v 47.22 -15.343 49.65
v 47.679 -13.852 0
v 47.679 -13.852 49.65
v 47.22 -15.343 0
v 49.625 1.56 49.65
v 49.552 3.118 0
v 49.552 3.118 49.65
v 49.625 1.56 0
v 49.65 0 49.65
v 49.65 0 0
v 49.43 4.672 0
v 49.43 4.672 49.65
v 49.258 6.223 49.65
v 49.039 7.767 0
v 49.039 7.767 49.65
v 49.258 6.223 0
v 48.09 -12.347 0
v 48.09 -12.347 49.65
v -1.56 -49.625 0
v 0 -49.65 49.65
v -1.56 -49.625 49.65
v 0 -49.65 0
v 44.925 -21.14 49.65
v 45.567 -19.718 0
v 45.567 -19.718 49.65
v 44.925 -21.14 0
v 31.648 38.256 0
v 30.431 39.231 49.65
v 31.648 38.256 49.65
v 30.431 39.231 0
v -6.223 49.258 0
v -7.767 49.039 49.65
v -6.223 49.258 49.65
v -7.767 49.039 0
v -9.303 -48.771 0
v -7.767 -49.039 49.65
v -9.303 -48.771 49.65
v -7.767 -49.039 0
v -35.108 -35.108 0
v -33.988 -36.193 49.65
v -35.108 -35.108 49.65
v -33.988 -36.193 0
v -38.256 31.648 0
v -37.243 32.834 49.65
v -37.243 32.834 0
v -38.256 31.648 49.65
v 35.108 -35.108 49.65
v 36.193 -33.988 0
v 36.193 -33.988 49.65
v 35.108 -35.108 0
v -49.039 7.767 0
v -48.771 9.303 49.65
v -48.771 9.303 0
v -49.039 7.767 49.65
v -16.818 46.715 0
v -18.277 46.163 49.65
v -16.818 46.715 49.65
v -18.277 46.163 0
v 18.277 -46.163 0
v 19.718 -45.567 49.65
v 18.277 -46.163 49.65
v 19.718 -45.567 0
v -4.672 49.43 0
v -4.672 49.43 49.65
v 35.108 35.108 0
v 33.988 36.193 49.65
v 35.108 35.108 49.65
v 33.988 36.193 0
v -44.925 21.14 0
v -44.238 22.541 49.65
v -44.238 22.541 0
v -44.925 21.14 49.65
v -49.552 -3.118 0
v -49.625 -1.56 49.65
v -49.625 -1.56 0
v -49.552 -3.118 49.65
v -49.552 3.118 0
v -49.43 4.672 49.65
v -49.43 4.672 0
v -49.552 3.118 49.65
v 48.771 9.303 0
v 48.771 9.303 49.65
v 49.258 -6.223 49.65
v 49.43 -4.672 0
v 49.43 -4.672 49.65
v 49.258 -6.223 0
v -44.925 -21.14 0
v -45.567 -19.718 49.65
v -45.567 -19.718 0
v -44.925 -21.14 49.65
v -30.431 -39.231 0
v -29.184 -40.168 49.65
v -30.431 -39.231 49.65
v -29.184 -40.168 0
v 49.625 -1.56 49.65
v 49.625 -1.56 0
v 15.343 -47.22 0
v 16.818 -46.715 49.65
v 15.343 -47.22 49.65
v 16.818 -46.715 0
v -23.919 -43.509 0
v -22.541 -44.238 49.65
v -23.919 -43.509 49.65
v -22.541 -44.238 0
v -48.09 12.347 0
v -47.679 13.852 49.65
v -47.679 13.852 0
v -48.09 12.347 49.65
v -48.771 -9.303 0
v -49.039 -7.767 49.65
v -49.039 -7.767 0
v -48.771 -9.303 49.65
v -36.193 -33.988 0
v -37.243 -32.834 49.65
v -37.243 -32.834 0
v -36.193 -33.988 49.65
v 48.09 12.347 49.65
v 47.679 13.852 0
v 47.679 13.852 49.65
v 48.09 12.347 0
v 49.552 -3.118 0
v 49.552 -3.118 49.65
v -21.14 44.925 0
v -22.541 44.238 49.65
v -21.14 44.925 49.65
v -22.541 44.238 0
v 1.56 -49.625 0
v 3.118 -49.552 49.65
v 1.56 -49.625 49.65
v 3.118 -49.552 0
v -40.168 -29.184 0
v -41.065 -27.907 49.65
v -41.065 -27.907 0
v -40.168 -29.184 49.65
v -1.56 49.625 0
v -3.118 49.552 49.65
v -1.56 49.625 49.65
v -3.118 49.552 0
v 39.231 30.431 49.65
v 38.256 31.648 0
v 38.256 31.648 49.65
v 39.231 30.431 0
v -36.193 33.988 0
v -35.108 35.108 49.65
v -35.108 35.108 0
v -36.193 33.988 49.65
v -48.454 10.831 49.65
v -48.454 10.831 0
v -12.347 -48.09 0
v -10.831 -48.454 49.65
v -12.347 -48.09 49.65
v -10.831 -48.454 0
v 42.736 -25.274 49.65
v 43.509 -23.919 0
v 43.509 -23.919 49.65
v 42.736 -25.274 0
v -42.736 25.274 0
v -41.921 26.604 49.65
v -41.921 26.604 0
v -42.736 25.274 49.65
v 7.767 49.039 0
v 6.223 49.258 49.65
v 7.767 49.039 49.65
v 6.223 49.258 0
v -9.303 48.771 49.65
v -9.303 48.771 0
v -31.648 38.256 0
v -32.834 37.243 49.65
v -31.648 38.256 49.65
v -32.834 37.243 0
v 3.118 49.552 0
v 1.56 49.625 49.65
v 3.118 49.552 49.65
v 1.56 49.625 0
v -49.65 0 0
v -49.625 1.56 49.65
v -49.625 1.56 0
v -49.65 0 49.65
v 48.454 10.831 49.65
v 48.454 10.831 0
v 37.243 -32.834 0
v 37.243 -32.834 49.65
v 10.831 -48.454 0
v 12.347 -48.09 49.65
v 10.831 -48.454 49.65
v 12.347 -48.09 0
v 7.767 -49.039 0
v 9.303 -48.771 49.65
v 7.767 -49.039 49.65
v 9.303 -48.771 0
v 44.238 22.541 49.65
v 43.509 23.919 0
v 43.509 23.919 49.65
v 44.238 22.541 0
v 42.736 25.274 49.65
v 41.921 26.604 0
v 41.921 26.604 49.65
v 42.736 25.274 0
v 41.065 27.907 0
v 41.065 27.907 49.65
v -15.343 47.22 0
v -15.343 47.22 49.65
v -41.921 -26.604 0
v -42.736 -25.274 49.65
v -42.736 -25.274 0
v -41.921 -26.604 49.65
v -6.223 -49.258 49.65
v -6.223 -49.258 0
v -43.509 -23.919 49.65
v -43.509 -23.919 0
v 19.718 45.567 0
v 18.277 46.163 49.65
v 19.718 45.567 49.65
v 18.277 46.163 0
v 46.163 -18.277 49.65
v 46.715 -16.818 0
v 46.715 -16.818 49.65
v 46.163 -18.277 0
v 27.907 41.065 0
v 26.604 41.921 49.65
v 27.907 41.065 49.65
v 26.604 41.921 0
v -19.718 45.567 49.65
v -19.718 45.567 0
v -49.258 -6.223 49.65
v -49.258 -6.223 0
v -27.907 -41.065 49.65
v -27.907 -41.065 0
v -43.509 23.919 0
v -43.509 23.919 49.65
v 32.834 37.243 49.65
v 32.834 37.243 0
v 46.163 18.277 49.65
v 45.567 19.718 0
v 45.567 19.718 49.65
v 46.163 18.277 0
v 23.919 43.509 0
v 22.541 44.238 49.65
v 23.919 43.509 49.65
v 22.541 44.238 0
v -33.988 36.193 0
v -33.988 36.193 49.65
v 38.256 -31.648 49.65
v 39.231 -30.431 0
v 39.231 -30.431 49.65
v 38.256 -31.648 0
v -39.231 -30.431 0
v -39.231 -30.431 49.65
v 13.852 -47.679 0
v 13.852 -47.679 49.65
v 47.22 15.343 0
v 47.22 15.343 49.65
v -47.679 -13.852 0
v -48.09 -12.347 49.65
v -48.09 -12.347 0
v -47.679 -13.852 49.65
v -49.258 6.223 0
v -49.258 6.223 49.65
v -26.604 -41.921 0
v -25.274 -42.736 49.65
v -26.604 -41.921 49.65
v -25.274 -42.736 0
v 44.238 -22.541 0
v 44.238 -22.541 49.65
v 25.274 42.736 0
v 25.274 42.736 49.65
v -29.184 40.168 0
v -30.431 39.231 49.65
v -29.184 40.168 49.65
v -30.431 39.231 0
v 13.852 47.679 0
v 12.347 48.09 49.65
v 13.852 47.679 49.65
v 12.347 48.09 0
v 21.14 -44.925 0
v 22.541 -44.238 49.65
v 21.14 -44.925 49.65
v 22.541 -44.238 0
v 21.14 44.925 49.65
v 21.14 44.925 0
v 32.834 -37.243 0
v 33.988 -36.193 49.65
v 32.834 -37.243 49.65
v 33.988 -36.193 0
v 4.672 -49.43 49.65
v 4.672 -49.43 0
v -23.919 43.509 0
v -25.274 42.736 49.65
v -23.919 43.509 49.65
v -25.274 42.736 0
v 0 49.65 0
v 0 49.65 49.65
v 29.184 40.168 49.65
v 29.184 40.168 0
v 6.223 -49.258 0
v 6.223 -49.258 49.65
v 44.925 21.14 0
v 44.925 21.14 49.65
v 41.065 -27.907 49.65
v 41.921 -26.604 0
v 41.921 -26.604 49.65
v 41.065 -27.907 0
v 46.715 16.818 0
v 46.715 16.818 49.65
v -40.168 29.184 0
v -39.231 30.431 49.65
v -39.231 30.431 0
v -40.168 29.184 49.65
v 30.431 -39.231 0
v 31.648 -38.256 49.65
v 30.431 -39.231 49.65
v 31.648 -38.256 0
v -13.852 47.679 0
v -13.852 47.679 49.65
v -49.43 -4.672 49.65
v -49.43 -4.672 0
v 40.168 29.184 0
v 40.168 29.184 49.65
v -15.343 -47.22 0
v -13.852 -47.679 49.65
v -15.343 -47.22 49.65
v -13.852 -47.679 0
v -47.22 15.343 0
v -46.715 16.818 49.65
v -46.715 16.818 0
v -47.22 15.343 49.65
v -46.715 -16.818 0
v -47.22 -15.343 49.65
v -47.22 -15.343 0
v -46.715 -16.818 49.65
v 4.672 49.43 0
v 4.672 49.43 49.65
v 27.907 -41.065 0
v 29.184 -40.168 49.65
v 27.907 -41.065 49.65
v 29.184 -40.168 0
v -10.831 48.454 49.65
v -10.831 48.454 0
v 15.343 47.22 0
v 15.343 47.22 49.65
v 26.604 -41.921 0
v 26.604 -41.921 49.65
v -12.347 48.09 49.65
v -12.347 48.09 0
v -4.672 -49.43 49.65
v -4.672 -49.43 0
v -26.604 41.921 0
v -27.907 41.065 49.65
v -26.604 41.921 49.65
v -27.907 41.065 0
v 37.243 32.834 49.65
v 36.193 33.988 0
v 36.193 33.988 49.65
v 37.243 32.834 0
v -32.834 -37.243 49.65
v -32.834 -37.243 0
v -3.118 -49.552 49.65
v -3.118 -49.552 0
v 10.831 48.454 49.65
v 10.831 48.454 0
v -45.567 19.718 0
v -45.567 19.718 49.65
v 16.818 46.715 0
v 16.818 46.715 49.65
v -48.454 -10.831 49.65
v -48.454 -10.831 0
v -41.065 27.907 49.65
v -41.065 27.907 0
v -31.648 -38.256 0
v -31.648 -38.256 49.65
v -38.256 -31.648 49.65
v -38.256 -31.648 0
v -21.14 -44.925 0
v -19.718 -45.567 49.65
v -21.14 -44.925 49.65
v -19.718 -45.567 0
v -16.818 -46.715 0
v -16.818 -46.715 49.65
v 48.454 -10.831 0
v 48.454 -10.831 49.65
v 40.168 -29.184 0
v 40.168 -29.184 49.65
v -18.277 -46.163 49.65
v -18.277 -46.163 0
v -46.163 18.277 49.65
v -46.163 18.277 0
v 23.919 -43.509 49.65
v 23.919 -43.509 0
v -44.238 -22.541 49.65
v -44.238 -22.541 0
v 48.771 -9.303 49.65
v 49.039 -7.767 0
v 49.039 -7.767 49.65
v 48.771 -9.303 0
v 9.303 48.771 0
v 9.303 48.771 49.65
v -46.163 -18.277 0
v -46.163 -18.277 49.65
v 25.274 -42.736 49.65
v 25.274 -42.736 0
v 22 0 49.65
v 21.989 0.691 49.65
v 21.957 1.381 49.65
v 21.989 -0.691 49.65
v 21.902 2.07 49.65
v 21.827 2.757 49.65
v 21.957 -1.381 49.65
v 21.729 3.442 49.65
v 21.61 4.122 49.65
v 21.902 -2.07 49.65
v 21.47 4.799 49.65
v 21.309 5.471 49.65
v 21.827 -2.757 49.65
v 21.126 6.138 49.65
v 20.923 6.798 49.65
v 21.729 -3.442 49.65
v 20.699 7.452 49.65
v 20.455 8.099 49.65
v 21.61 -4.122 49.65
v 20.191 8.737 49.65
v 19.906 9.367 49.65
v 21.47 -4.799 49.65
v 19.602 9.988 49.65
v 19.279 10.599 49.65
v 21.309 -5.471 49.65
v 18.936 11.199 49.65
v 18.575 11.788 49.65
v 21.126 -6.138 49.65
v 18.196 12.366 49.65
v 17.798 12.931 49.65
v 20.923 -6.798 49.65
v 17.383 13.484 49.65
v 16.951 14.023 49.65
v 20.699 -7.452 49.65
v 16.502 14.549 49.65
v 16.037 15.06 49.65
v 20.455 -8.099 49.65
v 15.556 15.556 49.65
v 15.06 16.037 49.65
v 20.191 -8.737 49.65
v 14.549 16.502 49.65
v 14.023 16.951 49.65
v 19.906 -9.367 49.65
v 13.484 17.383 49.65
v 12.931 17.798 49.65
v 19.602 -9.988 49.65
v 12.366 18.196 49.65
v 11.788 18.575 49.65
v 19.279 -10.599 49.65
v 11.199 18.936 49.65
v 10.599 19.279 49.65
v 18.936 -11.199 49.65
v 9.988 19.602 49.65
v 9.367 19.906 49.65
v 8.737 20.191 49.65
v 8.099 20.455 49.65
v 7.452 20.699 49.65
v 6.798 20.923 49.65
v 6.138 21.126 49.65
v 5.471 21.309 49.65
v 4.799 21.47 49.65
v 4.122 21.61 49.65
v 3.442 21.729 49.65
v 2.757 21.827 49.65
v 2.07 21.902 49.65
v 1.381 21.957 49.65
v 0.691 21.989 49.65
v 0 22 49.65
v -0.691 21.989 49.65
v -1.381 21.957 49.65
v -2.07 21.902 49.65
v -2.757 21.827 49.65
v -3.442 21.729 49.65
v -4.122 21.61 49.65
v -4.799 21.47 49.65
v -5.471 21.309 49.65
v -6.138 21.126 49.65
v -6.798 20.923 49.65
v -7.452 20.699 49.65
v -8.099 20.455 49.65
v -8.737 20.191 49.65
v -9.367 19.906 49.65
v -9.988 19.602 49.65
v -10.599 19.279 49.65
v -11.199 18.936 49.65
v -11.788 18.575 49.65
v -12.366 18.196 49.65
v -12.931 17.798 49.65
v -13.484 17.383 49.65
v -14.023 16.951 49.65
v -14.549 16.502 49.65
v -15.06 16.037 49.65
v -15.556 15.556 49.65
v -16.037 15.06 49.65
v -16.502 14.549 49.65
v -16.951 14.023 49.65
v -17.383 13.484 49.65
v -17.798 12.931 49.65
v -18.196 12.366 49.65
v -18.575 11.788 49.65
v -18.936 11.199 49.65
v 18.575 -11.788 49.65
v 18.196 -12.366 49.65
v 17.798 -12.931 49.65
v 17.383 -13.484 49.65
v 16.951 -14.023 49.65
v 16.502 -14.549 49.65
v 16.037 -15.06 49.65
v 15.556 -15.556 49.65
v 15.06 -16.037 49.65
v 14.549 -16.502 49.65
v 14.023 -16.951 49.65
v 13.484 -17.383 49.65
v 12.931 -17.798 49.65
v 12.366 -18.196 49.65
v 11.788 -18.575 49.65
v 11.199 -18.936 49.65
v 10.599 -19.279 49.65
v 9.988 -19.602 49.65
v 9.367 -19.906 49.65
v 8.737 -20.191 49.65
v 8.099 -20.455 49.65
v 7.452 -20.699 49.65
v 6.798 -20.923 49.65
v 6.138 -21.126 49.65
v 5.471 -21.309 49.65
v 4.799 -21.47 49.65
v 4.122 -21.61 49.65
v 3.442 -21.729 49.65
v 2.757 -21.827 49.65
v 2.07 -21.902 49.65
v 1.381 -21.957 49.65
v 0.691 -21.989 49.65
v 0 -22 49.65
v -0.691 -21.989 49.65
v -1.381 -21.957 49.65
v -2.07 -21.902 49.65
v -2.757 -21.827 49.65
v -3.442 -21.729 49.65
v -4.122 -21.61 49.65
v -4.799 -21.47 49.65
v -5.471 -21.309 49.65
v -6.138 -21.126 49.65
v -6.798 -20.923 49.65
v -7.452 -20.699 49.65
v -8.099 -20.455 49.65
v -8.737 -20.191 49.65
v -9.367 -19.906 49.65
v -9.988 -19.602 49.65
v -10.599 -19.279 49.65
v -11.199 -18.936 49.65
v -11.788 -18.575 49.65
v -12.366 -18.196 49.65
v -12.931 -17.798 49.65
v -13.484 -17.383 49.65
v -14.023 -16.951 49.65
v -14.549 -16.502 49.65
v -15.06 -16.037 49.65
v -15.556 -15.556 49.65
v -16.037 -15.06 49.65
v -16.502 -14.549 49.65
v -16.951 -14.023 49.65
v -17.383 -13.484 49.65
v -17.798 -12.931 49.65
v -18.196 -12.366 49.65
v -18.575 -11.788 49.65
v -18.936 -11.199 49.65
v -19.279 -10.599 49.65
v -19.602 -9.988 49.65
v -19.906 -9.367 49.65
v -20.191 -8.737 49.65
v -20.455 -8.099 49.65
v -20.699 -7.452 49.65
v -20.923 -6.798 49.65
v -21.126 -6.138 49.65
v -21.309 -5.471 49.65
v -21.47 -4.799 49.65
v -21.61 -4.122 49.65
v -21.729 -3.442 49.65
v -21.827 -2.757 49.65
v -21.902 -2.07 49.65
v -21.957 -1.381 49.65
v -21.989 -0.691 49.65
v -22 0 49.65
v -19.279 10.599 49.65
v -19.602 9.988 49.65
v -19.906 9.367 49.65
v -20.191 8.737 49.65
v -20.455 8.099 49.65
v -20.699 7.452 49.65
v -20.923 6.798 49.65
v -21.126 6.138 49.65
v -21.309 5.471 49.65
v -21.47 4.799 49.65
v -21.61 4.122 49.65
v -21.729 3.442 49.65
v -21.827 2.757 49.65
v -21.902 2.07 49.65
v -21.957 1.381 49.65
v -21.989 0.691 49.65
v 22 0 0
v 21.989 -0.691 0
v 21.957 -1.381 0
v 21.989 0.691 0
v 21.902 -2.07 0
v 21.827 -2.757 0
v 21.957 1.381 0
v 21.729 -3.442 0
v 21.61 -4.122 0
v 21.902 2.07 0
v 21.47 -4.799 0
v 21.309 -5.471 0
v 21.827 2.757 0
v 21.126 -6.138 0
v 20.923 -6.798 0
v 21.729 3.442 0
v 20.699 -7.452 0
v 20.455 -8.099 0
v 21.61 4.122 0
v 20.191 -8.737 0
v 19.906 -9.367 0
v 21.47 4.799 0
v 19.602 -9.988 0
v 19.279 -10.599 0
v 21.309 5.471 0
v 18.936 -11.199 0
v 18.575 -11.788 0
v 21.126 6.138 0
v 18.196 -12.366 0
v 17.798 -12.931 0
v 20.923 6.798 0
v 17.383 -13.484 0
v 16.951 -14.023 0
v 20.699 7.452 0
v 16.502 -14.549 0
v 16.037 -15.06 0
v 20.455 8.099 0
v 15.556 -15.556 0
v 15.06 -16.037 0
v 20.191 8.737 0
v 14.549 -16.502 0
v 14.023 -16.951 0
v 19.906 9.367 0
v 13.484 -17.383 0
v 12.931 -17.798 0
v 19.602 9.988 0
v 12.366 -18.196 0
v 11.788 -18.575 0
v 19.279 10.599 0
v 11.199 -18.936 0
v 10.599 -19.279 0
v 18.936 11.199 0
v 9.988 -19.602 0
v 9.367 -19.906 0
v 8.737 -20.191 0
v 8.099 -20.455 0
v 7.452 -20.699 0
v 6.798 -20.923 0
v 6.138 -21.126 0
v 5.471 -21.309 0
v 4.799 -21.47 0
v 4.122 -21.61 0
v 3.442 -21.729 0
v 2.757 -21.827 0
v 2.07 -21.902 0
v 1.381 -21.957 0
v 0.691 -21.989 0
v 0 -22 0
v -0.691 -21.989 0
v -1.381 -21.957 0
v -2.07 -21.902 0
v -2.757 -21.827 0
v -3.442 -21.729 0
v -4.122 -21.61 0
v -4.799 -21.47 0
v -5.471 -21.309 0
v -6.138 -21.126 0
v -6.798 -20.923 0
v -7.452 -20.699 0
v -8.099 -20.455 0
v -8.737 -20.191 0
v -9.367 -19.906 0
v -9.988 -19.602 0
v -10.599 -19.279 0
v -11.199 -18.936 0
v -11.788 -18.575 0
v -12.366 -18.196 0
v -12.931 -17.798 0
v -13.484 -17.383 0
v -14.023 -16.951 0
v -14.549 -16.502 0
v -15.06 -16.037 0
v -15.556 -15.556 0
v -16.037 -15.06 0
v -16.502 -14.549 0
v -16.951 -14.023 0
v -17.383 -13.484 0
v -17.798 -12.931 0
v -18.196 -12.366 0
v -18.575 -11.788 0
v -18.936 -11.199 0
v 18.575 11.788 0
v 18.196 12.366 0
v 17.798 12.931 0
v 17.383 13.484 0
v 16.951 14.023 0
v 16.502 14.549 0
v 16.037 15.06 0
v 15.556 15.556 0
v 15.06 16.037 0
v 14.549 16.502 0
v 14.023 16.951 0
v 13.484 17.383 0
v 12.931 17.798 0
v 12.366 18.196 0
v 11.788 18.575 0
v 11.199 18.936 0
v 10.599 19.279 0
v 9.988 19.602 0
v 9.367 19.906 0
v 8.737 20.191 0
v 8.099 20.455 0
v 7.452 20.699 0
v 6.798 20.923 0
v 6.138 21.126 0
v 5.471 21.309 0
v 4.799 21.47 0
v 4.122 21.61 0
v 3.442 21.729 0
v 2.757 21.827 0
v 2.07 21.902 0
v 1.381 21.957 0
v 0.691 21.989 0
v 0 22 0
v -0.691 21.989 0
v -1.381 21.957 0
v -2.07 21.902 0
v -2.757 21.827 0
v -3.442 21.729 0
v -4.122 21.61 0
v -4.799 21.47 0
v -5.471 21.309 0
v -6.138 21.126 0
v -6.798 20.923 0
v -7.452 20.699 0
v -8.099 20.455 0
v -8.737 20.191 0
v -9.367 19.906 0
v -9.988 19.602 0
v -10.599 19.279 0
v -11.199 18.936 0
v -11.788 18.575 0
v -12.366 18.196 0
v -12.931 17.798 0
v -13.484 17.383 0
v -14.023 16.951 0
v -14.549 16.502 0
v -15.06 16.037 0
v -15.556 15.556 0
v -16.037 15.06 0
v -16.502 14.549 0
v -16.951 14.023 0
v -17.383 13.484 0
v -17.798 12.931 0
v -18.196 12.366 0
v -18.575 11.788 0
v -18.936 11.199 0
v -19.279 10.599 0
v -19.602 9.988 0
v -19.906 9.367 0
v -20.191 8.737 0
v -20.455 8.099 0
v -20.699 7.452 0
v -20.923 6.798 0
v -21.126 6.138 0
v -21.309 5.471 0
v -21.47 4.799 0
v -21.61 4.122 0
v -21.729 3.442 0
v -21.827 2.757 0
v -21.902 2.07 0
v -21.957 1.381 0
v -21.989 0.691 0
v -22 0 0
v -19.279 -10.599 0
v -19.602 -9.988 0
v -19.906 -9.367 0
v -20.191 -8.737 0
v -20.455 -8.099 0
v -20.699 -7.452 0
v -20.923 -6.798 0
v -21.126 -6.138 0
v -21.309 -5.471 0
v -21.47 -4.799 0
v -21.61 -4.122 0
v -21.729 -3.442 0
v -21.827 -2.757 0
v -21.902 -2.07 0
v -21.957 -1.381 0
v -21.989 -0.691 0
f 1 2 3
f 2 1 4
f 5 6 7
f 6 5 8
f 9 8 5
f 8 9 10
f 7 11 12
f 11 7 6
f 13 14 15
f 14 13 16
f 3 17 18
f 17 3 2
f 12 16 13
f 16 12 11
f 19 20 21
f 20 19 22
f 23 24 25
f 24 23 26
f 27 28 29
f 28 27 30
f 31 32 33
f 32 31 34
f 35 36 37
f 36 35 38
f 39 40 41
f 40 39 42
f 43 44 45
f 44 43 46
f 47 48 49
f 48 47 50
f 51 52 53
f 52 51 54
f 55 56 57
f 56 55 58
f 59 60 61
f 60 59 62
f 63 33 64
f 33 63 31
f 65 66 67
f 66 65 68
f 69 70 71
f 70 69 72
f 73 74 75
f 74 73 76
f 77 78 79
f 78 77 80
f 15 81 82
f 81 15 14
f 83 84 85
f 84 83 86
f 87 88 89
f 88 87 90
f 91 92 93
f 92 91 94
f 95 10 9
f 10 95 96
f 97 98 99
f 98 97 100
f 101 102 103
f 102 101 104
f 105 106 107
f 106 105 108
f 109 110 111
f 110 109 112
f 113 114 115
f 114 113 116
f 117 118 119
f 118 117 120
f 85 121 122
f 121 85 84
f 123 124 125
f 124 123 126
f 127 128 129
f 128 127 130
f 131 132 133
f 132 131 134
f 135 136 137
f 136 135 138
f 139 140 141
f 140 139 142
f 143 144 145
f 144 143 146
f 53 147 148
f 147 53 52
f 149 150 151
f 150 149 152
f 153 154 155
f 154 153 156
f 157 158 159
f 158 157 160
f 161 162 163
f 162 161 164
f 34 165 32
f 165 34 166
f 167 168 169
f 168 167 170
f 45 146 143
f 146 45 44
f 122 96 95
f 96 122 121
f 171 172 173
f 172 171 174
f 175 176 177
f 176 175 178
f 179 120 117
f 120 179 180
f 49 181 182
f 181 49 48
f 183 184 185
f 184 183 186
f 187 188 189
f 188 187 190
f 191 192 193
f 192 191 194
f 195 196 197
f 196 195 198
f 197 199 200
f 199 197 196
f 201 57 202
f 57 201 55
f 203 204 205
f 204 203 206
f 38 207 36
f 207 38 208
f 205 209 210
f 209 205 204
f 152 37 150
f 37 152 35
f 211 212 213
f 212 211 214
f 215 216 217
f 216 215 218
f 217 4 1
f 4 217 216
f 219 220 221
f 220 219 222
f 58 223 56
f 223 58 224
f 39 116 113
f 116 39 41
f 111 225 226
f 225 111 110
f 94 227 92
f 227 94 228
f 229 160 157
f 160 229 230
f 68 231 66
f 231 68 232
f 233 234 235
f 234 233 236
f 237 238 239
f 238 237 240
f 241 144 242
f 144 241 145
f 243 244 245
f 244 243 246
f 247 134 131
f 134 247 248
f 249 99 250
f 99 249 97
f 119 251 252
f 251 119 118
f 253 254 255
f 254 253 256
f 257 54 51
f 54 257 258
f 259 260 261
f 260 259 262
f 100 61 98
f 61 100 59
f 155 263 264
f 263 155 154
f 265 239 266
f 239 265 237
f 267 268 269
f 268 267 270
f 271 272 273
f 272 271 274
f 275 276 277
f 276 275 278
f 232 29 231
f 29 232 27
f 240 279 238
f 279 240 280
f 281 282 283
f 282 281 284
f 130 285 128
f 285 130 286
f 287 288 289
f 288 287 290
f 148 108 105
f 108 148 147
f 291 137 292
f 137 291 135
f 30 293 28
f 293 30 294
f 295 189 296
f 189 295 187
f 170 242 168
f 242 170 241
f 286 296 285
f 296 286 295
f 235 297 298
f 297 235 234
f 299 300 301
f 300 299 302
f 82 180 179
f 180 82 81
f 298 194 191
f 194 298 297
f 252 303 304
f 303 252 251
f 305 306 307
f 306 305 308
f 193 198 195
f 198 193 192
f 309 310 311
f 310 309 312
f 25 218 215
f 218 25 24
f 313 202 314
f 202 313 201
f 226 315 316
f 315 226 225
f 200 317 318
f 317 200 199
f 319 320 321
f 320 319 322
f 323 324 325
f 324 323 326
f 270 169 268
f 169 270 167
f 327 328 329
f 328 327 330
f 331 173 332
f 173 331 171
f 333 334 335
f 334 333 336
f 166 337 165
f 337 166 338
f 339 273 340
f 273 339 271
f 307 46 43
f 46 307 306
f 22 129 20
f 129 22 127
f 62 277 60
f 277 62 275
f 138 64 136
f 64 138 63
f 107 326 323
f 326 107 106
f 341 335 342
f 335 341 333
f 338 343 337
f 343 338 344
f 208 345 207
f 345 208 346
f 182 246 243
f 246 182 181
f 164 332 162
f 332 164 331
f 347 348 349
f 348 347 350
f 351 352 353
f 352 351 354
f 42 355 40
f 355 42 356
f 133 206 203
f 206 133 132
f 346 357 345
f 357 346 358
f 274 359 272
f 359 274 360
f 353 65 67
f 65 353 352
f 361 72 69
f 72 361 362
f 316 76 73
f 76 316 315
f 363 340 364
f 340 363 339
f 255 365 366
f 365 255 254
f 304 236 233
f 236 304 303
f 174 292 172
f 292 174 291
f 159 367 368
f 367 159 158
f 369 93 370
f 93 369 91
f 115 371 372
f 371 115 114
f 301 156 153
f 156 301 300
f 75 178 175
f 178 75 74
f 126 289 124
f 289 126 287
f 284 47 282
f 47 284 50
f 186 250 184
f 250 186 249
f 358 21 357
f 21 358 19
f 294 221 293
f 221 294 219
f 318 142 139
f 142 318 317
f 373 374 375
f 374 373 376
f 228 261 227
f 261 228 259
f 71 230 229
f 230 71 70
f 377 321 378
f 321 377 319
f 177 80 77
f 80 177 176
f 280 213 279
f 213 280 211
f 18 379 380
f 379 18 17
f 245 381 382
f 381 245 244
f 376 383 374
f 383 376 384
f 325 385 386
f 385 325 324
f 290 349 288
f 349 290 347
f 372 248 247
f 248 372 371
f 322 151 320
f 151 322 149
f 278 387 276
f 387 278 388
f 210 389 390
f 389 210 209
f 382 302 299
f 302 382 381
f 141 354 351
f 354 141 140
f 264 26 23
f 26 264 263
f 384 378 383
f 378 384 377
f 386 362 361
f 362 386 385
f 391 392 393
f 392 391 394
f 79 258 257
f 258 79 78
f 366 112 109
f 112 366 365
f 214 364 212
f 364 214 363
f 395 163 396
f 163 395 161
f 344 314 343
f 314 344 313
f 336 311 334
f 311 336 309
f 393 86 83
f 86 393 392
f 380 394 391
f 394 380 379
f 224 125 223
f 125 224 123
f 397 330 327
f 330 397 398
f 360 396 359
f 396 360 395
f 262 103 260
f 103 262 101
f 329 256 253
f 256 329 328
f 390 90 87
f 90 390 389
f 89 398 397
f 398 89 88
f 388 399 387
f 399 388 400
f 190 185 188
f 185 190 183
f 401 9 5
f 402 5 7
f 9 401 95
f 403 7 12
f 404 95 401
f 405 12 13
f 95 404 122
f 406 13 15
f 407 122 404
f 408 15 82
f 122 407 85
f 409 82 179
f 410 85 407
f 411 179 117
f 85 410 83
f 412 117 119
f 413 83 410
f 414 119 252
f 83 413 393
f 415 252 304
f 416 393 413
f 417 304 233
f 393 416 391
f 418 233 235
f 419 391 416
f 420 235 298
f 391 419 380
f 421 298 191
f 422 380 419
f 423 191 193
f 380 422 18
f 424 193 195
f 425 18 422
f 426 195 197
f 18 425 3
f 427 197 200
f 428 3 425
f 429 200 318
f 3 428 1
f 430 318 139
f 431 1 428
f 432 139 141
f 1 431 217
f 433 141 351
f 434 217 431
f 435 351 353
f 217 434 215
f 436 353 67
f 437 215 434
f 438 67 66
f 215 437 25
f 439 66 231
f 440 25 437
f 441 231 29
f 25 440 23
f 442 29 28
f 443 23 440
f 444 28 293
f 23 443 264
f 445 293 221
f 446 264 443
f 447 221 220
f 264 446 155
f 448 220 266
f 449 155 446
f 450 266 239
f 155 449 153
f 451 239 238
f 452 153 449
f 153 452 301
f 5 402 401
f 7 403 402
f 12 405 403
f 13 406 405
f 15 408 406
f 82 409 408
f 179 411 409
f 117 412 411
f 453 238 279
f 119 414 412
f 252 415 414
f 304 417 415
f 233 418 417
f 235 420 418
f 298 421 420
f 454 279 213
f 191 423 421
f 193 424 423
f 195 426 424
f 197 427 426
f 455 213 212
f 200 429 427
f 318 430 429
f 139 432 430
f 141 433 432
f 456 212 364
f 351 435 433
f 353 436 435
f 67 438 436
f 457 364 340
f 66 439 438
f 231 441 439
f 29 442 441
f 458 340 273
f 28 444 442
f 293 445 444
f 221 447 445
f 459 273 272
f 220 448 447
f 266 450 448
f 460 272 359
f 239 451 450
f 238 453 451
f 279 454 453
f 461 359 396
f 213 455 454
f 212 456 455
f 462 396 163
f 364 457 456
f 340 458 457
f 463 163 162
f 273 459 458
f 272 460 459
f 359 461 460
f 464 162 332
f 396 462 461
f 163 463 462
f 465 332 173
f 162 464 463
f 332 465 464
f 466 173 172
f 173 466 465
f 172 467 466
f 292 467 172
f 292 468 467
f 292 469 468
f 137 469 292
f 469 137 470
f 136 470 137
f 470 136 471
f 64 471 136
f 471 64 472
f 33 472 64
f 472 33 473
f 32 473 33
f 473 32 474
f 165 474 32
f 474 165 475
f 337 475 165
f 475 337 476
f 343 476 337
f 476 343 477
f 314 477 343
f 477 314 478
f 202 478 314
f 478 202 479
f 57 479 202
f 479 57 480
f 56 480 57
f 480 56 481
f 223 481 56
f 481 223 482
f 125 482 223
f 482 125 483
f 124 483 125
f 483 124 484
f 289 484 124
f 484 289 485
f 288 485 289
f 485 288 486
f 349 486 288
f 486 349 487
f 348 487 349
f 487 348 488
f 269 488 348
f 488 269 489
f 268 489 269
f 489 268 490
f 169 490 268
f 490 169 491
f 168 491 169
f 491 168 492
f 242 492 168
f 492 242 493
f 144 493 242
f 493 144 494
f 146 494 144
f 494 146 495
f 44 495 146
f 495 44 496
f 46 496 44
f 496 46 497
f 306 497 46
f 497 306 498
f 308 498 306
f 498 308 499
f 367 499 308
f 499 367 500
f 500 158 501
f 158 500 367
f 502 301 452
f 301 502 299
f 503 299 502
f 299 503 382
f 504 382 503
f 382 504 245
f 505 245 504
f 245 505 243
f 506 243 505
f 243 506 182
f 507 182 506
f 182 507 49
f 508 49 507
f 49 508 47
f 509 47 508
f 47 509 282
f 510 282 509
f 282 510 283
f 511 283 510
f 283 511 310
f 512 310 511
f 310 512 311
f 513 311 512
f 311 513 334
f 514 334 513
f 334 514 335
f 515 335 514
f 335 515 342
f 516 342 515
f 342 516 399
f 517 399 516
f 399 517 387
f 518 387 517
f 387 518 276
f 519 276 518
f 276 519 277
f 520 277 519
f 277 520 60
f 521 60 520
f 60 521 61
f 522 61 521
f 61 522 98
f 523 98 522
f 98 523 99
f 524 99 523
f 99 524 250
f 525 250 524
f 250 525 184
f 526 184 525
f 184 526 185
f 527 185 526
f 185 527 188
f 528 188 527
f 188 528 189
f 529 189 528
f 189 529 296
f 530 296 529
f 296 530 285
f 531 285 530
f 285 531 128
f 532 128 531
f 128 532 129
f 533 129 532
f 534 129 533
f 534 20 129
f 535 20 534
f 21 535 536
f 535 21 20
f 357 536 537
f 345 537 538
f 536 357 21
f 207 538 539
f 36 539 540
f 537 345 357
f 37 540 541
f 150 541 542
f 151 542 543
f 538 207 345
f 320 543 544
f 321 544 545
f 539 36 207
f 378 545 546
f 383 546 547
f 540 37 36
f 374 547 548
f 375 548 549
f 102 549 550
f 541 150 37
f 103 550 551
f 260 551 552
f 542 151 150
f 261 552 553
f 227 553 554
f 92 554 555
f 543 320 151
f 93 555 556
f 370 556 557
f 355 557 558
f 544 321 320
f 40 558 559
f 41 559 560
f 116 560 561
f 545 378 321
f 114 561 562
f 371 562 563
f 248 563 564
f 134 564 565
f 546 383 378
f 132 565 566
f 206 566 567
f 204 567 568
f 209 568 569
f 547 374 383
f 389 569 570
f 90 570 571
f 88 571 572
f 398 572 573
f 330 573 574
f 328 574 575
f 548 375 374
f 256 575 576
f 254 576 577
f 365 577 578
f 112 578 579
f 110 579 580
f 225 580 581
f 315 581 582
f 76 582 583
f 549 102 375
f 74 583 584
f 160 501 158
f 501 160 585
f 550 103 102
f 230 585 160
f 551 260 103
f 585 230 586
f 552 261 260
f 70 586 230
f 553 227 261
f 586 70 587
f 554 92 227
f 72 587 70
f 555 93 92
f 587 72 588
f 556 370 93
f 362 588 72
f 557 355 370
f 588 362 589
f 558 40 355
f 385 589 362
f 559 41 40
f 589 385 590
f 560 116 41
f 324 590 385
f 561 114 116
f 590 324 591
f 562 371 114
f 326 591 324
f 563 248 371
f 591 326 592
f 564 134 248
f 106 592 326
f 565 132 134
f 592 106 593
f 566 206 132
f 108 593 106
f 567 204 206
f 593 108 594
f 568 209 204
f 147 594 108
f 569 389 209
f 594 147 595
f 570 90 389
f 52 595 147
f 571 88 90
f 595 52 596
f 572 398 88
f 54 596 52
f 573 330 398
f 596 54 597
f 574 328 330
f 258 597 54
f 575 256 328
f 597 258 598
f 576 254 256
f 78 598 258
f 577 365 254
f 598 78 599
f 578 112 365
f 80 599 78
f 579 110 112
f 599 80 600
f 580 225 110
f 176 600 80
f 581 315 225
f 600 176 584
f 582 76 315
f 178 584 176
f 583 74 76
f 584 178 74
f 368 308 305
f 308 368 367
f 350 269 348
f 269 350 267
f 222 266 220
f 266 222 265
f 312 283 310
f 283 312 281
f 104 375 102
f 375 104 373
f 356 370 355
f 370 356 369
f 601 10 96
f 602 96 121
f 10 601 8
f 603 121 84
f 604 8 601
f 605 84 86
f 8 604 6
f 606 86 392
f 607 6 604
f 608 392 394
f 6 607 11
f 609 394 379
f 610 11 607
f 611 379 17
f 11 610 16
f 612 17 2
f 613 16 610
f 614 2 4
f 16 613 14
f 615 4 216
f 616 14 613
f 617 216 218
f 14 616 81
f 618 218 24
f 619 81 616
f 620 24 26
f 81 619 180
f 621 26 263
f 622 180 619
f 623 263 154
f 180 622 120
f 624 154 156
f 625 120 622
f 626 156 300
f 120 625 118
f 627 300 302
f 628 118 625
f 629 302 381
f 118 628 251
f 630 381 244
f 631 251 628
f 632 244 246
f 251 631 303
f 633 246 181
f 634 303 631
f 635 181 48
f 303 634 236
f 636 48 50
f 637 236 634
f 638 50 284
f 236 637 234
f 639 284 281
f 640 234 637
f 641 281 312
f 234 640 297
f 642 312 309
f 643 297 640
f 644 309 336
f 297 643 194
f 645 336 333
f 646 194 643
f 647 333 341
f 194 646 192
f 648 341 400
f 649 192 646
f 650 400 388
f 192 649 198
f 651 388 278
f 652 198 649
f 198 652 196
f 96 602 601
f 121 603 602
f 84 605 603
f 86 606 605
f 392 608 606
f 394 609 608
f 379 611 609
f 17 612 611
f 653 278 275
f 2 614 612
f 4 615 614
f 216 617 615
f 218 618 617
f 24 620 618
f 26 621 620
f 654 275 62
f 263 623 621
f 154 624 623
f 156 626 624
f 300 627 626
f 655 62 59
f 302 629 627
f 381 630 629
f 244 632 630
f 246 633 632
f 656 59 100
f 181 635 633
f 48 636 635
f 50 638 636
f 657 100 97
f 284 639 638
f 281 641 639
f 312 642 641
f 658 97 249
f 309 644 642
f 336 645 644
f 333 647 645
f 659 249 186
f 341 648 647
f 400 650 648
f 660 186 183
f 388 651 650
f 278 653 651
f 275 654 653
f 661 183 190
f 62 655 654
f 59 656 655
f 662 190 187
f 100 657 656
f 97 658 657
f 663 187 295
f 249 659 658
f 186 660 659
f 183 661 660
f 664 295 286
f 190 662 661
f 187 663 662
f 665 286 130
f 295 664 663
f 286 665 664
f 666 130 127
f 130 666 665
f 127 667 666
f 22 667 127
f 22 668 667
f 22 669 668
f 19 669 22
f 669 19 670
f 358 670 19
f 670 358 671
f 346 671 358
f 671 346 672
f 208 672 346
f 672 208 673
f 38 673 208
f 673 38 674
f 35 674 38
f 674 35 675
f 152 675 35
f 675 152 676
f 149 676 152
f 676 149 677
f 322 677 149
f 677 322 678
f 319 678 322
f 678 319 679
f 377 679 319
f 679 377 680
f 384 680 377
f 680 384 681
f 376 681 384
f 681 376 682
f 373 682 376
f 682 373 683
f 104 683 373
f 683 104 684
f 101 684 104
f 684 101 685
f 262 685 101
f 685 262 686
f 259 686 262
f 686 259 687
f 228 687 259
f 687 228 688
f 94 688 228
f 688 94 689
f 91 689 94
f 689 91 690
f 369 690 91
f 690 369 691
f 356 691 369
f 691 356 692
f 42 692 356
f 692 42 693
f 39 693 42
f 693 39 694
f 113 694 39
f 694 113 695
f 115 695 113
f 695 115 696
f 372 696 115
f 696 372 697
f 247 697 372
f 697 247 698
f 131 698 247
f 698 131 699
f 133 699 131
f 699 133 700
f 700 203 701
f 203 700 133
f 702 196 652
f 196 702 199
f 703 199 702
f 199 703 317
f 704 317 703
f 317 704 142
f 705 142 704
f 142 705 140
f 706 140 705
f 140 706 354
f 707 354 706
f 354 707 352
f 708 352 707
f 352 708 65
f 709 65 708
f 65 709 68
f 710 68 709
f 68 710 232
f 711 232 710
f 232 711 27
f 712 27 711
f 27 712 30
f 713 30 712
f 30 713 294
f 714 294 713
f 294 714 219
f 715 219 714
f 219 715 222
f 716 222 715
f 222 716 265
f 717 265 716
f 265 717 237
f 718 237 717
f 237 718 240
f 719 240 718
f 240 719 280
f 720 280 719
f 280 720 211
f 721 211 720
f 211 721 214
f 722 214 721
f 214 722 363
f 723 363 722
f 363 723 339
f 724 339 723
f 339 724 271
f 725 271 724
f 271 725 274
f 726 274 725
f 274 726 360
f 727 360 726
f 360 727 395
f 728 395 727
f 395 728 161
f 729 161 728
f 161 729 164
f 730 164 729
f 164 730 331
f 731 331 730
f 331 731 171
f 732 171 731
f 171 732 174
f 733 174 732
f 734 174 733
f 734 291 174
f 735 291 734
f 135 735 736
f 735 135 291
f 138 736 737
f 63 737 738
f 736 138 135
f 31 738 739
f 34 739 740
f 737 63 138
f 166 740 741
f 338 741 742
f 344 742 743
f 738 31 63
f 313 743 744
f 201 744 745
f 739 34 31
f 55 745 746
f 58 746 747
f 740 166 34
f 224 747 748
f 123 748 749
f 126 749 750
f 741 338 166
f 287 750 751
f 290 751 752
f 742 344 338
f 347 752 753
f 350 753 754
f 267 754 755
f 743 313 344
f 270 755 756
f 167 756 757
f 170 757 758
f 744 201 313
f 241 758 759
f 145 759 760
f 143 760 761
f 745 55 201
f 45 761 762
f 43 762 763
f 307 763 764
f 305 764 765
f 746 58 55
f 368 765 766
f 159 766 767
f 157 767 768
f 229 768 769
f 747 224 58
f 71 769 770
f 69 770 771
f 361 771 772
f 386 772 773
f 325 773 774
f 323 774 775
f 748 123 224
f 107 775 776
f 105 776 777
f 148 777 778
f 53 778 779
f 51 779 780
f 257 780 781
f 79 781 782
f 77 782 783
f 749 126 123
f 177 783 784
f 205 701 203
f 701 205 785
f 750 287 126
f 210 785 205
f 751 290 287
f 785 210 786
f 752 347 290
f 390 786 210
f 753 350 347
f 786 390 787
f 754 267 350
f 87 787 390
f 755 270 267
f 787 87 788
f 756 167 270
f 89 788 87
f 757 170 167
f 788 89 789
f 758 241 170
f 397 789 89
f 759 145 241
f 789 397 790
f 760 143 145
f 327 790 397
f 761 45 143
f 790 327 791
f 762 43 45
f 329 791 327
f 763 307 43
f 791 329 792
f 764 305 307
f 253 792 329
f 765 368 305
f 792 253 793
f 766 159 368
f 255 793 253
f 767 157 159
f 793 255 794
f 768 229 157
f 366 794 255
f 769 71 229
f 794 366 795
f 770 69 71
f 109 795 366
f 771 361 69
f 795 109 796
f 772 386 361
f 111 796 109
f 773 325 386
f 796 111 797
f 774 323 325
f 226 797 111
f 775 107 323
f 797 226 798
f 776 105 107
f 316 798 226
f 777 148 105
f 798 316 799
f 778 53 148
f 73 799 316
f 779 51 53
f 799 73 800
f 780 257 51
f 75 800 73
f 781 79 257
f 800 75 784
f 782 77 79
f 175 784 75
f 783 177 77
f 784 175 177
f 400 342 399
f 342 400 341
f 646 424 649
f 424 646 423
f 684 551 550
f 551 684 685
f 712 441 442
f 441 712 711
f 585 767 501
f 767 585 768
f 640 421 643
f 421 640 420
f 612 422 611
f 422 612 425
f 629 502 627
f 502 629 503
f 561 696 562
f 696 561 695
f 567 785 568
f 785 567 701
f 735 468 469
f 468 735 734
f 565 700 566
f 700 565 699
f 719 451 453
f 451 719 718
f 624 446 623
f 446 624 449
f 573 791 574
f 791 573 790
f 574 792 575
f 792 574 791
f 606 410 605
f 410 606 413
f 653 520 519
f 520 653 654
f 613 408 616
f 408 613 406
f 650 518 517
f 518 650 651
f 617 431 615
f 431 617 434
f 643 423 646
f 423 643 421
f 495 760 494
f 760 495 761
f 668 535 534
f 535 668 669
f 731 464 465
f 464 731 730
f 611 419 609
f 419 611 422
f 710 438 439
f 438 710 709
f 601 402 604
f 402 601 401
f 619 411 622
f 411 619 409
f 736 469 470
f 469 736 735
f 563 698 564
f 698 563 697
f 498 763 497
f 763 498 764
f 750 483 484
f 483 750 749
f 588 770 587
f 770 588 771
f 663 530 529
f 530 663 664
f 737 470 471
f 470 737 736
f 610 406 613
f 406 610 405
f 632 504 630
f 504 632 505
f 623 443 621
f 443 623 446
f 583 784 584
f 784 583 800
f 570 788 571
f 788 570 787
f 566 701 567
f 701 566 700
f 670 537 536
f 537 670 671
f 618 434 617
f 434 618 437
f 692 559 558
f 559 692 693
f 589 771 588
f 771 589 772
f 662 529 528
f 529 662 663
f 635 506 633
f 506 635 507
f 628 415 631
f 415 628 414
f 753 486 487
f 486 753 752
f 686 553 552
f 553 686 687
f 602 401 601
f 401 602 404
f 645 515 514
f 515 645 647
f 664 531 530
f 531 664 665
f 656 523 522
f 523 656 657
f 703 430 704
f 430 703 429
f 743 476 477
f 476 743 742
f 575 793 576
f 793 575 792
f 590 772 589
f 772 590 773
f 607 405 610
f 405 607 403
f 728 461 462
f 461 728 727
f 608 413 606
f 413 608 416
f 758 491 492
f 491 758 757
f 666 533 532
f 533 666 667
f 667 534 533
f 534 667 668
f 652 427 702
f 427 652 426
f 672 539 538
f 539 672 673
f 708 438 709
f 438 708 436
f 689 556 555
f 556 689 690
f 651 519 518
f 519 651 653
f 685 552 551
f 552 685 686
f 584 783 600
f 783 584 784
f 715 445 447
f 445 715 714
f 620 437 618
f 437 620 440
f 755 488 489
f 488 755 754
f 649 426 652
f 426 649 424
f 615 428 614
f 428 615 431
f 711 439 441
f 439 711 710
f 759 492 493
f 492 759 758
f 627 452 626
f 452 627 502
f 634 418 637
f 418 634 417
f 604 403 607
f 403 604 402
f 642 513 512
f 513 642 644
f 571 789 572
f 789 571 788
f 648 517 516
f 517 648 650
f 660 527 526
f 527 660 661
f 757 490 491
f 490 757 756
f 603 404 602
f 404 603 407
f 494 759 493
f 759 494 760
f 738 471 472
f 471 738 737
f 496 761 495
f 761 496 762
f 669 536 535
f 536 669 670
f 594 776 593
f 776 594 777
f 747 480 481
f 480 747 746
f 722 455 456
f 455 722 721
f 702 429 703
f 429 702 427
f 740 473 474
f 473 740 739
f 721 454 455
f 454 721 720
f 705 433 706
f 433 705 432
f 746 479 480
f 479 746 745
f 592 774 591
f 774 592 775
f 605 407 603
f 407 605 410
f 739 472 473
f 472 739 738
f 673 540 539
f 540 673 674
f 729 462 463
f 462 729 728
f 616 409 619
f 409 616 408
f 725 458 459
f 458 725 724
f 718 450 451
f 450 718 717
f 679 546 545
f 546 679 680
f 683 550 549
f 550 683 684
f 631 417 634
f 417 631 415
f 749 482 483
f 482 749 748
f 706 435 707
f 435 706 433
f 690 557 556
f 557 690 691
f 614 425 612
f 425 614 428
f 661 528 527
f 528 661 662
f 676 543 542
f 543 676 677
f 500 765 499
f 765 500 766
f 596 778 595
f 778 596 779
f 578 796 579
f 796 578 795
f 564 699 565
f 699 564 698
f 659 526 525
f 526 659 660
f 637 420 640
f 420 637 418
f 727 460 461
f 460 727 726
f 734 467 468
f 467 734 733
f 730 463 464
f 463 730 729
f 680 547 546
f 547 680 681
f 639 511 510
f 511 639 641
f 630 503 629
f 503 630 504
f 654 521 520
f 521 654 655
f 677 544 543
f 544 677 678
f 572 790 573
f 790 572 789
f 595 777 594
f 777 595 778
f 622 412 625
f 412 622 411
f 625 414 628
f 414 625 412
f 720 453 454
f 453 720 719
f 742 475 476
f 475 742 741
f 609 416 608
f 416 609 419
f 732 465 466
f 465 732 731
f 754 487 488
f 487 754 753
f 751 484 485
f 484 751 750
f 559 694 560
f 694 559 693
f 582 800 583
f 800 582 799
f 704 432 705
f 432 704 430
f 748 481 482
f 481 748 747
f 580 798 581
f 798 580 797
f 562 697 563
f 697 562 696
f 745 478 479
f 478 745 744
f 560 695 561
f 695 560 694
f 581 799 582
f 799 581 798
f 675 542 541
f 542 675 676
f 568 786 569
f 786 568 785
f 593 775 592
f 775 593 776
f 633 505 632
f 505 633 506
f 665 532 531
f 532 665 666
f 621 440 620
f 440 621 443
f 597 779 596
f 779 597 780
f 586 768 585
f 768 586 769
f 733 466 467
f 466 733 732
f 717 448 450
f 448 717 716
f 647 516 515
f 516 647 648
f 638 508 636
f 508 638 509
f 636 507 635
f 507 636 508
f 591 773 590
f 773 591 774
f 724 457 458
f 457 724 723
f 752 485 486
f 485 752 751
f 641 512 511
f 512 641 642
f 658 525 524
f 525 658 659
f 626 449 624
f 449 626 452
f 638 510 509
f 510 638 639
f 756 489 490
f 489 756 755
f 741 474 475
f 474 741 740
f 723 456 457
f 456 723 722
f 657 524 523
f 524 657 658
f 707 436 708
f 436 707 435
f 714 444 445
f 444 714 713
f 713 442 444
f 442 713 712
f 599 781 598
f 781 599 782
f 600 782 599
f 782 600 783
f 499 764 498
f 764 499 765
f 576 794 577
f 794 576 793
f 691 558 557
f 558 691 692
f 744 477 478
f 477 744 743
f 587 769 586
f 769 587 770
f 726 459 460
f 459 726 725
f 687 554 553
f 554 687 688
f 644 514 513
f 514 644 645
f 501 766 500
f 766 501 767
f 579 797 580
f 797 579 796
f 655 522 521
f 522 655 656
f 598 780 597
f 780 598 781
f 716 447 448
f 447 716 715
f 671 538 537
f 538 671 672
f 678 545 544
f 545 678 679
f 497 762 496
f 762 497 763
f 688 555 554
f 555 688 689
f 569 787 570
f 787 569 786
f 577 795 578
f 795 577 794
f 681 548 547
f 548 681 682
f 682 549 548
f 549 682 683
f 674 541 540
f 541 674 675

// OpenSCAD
// Hollow cylinder (tube)
// OD = 99.3 mm, ID = 44 mm, H = 49.65 mm

OD = 99.3;
ID = 44;
H  = 49.65;

// 圆的分段数：越大越圆（也会更慢）
$fn = 200;

difference() {
    cylinder(h = H, d = OD, center = false);
    cylinder(h = H + 0.2, d = ID, center = false); // +0.2 防止共面残留
}
